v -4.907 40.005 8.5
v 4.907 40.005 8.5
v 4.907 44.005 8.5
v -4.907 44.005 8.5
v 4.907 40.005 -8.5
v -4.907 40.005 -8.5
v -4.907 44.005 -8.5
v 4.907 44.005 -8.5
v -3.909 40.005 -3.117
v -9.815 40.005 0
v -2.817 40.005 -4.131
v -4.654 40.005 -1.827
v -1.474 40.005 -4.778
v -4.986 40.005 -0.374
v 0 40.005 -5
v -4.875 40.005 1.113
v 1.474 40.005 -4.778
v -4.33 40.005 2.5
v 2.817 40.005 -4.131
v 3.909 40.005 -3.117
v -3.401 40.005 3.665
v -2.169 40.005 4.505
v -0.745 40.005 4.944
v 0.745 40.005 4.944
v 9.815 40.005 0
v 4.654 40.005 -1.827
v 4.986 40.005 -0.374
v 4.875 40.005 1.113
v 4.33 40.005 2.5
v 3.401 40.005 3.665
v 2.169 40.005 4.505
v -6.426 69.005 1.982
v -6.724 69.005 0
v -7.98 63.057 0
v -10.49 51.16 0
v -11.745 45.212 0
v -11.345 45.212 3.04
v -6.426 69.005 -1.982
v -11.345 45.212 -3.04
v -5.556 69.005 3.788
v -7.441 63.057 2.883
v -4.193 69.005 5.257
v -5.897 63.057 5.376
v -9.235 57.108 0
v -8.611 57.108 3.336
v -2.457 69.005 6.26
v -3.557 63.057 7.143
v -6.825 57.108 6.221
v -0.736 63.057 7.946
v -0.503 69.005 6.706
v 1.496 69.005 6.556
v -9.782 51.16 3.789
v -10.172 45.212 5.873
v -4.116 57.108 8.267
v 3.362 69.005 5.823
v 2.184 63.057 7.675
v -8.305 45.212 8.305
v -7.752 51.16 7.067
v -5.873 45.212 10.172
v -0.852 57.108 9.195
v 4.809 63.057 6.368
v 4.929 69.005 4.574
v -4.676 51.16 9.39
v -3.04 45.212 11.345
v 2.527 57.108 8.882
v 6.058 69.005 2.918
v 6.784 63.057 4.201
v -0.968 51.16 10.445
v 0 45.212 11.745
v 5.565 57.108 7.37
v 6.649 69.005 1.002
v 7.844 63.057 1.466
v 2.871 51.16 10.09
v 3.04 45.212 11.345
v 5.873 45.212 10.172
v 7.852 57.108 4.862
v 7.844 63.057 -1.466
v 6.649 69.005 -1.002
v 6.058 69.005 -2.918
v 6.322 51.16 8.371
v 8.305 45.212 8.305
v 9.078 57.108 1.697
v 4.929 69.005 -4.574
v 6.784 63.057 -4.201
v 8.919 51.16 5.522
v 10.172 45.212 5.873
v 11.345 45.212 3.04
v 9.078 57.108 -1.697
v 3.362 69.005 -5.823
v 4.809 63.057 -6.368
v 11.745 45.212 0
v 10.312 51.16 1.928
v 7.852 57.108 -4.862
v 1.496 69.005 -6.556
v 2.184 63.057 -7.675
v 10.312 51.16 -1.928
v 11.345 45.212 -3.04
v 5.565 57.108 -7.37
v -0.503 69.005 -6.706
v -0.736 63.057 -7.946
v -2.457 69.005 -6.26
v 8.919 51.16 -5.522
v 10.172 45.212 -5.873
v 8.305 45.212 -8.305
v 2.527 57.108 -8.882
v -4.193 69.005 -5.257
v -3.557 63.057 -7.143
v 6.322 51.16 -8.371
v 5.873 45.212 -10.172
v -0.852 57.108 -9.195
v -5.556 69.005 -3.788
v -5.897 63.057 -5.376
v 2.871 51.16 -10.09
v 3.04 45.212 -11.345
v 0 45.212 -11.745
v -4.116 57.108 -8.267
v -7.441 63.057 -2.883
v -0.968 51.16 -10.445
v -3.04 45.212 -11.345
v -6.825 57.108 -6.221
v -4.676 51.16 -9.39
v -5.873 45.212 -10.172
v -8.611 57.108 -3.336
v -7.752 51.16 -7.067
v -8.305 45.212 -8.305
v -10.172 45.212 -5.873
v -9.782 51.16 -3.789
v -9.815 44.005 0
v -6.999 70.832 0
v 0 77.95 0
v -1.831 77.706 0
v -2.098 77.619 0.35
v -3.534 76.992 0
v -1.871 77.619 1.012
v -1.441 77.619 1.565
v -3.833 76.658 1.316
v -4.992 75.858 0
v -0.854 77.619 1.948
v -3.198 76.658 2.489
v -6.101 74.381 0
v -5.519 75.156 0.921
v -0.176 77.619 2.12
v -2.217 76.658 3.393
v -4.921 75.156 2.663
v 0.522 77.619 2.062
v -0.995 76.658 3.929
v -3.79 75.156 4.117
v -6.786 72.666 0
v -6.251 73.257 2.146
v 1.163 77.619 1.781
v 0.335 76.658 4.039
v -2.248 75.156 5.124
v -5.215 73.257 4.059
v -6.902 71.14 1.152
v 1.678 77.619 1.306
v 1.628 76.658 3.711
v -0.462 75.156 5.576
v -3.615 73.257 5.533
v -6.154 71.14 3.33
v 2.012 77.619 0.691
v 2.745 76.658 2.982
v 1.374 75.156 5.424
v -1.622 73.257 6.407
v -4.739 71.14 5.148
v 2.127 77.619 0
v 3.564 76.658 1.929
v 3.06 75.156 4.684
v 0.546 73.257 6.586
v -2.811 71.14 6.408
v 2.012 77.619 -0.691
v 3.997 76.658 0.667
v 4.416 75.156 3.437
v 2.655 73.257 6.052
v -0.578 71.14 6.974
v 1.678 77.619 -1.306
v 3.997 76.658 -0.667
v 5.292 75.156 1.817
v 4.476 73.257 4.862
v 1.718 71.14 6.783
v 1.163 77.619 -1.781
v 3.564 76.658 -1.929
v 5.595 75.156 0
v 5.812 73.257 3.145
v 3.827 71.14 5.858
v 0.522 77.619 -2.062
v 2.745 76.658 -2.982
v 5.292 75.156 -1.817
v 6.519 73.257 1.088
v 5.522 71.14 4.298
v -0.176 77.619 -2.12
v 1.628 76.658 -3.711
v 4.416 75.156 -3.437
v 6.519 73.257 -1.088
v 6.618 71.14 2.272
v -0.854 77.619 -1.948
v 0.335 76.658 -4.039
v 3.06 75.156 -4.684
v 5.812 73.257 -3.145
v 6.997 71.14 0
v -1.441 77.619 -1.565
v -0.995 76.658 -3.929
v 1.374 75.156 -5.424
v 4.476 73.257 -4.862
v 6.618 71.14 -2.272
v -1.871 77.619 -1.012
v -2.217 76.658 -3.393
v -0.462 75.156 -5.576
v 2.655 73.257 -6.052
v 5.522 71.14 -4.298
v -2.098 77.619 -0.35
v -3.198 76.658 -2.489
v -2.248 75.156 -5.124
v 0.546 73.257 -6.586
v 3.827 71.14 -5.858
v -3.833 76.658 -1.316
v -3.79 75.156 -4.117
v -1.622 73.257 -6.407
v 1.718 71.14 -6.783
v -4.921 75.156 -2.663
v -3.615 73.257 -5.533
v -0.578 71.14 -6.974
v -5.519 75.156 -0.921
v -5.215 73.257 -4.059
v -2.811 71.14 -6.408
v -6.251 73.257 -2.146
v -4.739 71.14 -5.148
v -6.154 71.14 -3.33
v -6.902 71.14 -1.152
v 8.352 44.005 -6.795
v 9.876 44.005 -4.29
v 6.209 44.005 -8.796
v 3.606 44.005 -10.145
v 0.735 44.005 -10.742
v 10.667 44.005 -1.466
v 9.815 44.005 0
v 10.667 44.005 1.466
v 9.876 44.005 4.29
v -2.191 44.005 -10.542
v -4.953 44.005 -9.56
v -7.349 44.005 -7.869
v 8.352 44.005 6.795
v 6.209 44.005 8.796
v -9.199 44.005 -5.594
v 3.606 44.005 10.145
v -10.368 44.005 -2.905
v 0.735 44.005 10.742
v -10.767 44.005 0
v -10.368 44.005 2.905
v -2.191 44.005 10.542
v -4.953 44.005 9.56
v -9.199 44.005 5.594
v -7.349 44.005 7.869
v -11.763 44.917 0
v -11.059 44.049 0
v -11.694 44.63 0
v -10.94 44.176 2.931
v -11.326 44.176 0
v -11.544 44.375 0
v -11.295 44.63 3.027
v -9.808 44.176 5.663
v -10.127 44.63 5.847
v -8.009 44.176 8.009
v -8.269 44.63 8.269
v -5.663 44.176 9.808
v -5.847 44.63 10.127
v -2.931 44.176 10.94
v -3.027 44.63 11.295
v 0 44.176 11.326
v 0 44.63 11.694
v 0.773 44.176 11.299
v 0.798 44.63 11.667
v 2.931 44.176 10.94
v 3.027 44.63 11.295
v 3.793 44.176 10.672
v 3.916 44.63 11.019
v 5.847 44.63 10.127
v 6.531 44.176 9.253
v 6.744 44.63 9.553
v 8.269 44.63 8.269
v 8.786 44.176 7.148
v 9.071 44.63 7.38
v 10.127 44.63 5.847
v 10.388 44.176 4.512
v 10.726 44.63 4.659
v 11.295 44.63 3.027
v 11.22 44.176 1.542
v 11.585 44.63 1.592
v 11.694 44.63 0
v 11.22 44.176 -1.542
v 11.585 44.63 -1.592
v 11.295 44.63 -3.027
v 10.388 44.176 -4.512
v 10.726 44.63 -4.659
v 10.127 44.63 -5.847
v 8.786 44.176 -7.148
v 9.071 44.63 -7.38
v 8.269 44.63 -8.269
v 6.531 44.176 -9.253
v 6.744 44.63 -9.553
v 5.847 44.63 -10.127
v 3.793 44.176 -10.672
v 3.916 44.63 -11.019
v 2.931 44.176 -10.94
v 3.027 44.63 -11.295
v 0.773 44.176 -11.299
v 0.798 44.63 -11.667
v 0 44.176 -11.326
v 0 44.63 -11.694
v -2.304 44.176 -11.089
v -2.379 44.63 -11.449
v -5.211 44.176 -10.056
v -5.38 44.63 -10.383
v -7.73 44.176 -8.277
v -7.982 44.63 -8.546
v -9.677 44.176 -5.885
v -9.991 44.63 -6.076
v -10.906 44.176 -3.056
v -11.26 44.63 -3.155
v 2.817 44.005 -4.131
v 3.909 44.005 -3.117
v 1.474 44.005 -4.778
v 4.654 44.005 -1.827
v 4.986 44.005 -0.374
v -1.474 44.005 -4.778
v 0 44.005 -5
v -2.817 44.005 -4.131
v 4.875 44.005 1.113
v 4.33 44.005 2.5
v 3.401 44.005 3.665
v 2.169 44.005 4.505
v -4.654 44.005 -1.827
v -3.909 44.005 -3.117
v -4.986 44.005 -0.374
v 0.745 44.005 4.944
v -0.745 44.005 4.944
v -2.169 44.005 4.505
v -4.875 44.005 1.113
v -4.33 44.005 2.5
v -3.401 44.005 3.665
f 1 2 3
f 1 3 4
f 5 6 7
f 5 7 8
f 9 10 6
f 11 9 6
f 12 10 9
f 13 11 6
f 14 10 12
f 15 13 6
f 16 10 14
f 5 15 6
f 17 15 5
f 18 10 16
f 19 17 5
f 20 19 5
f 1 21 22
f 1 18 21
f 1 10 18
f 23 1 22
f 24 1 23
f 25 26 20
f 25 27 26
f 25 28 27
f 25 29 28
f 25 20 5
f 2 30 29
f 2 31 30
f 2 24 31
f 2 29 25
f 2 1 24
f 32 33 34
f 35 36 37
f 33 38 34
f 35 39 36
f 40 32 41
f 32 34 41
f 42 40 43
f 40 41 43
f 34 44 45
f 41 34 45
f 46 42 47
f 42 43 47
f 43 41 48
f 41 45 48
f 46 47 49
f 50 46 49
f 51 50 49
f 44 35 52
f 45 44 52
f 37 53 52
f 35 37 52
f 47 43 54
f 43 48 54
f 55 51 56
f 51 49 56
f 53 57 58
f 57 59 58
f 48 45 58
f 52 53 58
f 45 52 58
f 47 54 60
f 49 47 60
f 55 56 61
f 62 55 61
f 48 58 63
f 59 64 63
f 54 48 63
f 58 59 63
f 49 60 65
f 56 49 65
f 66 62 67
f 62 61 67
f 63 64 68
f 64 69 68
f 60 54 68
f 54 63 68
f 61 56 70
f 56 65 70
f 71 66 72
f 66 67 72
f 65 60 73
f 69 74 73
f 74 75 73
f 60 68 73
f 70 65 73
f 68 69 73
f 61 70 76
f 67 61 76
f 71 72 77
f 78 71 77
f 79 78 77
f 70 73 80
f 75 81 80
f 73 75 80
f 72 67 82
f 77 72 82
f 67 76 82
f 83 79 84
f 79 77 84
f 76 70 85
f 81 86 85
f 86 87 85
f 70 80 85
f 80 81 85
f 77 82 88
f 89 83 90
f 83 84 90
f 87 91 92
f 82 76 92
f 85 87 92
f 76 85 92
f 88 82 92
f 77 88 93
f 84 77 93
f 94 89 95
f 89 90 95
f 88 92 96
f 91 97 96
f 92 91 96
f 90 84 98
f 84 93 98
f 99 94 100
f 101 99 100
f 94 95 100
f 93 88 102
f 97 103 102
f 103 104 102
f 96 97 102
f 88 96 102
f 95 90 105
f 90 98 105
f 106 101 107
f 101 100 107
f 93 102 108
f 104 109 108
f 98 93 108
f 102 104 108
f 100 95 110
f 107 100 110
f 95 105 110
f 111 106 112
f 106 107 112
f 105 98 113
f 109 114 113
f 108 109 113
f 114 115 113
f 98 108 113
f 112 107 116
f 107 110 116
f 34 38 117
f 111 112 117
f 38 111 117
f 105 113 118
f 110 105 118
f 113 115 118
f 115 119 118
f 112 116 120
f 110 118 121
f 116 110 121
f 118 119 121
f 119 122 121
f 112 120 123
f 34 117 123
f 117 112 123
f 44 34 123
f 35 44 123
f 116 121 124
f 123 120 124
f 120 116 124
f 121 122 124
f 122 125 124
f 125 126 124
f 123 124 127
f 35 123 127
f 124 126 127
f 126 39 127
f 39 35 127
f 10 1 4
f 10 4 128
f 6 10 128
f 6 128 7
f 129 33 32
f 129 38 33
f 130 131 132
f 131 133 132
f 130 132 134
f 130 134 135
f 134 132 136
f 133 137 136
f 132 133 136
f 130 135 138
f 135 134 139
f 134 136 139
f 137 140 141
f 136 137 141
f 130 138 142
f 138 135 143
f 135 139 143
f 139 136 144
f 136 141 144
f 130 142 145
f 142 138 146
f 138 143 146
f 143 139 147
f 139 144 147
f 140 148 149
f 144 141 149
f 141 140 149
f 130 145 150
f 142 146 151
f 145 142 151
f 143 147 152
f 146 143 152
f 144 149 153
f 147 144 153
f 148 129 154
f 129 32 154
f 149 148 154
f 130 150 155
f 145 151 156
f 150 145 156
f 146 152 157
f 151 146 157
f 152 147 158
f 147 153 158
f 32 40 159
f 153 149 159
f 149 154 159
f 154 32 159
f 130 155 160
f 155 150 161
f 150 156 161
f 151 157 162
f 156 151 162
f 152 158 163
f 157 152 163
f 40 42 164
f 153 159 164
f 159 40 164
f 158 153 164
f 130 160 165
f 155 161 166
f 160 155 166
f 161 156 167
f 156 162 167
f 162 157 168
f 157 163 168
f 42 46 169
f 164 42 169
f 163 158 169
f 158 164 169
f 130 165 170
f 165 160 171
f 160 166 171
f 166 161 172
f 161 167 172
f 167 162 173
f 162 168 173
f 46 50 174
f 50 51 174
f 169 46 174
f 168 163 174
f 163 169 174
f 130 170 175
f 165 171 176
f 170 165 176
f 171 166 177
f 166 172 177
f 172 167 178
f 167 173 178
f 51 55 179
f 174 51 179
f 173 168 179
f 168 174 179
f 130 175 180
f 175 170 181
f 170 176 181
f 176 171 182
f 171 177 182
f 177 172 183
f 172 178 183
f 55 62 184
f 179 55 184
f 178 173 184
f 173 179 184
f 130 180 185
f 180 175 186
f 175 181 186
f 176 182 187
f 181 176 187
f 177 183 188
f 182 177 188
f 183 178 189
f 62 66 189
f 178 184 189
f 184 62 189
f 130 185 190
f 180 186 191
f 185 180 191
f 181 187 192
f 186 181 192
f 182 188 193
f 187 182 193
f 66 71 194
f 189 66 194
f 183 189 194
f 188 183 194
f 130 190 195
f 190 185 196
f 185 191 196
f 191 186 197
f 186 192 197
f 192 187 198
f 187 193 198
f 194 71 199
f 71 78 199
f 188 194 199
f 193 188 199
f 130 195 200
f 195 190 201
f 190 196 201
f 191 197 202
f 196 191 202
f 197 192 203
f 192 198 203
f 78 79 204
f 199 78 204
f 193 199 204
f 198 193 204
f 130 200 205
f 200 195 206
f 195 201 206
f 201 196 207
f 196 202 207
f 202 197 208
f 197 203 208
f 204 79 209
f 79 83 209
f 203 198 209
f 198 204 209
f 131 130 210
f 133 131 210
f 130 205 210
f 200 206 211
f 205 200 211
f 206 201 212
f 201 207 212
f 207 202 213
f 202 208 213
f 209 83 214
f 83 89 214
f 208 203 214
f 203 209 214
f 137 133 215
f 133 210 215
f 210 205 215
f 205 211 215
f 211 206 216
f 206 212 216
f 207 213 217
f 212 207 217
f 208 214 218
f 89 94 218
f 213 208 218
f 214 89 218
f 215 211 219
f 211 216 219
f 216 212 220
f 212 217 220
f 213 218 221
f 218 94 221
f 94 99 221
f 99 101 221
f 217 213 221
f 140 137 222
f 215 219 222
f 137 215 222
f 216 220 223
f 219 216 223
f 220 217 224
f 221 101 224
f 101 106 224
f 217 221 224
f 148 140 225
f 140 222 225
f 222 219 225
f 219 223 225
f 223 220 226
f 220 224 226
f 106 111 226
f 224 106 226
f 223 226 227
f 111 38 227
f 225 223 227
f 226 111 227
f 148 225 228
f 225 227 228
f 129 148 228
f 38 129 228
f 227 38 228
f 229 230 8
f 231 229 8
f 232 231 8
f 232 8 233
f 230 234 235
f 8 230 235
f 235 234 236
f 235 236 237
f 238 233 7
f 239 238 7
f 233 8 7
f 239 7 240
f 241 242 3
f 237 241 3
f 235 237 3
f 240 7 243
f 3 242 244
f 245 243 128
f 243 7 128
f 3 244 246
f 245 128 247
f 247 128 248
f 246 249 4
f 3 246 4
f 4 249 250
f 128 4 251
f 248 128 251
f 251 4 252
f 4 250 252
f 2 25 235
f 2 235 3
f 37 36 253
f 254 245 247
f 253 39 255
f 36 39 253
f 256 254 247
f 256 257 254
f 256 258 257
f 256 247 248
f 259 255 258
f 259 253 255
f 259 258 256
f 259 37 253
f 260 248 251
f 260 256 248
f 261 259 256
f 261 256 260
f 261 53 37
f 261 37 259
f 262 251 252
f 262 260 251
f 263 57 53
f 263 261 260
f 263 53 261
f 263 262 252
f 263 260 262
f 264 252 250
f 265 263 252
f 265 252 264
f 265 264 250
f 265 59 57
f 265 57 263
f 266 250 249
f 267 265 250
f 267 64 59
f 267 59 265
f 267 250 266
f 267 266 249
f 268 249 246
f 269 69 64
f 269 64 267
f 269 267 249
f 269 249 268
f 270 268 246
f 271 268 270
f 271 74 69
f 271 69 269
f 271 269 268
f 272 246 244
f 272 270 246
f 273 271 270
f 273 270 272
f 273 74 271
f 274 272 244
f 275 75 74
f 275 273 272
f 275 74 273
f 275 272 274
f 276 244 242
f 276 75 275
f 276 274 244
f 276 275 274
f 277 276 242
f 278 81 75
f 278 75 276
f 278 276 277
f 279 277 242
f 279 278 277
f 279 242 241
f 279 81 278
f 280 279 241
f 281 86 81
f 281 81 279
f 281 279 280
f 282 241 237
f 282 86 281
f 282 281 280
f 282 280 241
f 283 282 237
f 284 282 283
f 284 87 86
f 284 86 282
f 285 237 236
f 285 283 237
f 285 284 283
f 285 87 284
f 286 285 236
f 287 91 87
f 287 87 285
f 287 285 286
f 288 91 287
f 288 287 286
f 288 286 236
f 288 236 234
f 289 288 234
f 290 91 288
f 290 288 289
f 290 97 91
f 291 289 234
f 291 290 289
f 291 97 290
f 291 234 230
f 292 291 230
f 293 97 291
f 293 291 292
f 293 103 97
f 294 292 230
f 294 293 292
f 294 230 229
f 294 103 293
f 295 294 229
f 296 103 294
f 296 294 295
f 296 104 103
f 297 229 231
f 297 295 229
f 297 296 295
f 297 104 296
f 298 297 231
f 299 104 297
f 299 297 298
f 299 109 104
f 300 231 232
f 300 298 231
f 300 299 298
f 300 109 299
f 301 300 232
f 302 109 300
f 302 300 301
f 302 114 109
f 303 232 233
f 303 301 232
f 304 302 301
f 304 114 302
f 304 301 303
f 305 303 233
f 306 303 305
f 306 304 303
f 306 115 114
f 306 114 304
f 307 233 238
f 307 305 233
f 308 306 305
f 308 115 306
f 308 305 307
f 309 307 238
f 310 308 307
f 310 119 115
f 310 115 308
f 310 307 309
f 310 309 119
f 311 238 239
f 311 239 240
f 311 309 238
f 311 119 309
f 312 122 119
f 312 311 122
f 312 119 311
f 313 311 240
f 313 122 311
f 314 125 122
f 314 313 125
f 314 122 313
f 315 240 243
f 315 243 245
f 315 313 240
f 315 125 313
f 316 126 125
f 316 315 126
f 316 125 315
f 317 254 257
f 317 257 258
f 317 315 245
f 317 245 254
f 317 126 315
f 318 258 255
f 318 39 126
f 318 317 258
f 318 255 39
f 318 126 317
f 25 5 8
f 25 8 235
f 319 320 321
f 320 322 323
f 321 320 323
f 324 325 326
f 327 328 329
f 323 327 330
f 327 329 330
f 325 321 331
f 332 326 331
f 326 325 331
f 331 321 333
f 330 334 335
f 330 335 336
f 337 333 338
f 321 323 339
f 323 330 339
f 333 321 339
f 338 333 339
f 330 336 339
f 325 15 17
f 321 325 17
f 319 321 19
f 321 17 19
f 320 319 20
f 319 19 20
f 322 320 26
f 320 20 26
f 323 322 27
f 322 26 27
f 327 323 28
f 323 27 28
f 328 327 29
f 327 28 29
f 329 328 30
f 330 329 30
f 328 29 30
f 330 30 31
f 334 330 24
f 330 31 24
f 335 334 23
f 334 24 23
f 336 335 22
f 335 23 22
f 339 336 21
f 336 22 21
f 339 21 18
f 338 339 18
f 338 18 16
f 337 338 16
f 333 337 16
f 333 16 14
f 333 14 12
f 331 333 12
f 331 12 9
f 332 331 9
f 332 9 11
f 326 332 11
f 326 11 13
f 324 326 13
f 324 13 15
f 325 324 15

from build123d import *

# Parameters (mm, degrees)
SKETCH2_R           = 5
BOSS_EXTRUDE1_DEPTH = 8
FILLET1_R           = 1


with BuildPart() as part:
    # Sketch1 → Revolve1 (revolve)
    with BuildSketch(Plane.XY):
        with BuildLine():
            Line((-6.724338957, 69.005082459), (-12, 44.005082459))
            Line((-12, 44.005082459), (0, 44.005082459))
            Line((0, 44.005082459), (0, 77.950144306))
            ThreePointArc((0, 77.950144306), (-5.59532988, 75.156363932), (-6.724338957, 69.005082459))
        make_face()
    revolve(axis=Axis((0, 0, 0), (0, 1, 0)))

    # Sketch2 → Boss-Extrude1 (add)
    with BuildSketch(Plane.XZ.offset(-40.005082459)):
        Polygon((9.814954576, 0), (4.907477288, 8.5), (-4.907477288, 8.5), (-9.814954576, 0), (-4.907477288, -8.5), (4.907477288, -8.5), align=None)
        with Locations(Location((0, 0, 0), (0, 0, 270))):
            Circle(SKETCH2_R, mode=Mode.SUBTRACT)
    extrude(amount=-BOSS_EXTRUDE1_DEPTH)

    # Fillet1
    fillet1_edges = [part.edges().sort_by_distance(p)[0] for p in [
        (12, 44.005082459, 0),
    ]]
    fillet(fillet1_edges, radius=FILLET1_R)


solid = part.part
